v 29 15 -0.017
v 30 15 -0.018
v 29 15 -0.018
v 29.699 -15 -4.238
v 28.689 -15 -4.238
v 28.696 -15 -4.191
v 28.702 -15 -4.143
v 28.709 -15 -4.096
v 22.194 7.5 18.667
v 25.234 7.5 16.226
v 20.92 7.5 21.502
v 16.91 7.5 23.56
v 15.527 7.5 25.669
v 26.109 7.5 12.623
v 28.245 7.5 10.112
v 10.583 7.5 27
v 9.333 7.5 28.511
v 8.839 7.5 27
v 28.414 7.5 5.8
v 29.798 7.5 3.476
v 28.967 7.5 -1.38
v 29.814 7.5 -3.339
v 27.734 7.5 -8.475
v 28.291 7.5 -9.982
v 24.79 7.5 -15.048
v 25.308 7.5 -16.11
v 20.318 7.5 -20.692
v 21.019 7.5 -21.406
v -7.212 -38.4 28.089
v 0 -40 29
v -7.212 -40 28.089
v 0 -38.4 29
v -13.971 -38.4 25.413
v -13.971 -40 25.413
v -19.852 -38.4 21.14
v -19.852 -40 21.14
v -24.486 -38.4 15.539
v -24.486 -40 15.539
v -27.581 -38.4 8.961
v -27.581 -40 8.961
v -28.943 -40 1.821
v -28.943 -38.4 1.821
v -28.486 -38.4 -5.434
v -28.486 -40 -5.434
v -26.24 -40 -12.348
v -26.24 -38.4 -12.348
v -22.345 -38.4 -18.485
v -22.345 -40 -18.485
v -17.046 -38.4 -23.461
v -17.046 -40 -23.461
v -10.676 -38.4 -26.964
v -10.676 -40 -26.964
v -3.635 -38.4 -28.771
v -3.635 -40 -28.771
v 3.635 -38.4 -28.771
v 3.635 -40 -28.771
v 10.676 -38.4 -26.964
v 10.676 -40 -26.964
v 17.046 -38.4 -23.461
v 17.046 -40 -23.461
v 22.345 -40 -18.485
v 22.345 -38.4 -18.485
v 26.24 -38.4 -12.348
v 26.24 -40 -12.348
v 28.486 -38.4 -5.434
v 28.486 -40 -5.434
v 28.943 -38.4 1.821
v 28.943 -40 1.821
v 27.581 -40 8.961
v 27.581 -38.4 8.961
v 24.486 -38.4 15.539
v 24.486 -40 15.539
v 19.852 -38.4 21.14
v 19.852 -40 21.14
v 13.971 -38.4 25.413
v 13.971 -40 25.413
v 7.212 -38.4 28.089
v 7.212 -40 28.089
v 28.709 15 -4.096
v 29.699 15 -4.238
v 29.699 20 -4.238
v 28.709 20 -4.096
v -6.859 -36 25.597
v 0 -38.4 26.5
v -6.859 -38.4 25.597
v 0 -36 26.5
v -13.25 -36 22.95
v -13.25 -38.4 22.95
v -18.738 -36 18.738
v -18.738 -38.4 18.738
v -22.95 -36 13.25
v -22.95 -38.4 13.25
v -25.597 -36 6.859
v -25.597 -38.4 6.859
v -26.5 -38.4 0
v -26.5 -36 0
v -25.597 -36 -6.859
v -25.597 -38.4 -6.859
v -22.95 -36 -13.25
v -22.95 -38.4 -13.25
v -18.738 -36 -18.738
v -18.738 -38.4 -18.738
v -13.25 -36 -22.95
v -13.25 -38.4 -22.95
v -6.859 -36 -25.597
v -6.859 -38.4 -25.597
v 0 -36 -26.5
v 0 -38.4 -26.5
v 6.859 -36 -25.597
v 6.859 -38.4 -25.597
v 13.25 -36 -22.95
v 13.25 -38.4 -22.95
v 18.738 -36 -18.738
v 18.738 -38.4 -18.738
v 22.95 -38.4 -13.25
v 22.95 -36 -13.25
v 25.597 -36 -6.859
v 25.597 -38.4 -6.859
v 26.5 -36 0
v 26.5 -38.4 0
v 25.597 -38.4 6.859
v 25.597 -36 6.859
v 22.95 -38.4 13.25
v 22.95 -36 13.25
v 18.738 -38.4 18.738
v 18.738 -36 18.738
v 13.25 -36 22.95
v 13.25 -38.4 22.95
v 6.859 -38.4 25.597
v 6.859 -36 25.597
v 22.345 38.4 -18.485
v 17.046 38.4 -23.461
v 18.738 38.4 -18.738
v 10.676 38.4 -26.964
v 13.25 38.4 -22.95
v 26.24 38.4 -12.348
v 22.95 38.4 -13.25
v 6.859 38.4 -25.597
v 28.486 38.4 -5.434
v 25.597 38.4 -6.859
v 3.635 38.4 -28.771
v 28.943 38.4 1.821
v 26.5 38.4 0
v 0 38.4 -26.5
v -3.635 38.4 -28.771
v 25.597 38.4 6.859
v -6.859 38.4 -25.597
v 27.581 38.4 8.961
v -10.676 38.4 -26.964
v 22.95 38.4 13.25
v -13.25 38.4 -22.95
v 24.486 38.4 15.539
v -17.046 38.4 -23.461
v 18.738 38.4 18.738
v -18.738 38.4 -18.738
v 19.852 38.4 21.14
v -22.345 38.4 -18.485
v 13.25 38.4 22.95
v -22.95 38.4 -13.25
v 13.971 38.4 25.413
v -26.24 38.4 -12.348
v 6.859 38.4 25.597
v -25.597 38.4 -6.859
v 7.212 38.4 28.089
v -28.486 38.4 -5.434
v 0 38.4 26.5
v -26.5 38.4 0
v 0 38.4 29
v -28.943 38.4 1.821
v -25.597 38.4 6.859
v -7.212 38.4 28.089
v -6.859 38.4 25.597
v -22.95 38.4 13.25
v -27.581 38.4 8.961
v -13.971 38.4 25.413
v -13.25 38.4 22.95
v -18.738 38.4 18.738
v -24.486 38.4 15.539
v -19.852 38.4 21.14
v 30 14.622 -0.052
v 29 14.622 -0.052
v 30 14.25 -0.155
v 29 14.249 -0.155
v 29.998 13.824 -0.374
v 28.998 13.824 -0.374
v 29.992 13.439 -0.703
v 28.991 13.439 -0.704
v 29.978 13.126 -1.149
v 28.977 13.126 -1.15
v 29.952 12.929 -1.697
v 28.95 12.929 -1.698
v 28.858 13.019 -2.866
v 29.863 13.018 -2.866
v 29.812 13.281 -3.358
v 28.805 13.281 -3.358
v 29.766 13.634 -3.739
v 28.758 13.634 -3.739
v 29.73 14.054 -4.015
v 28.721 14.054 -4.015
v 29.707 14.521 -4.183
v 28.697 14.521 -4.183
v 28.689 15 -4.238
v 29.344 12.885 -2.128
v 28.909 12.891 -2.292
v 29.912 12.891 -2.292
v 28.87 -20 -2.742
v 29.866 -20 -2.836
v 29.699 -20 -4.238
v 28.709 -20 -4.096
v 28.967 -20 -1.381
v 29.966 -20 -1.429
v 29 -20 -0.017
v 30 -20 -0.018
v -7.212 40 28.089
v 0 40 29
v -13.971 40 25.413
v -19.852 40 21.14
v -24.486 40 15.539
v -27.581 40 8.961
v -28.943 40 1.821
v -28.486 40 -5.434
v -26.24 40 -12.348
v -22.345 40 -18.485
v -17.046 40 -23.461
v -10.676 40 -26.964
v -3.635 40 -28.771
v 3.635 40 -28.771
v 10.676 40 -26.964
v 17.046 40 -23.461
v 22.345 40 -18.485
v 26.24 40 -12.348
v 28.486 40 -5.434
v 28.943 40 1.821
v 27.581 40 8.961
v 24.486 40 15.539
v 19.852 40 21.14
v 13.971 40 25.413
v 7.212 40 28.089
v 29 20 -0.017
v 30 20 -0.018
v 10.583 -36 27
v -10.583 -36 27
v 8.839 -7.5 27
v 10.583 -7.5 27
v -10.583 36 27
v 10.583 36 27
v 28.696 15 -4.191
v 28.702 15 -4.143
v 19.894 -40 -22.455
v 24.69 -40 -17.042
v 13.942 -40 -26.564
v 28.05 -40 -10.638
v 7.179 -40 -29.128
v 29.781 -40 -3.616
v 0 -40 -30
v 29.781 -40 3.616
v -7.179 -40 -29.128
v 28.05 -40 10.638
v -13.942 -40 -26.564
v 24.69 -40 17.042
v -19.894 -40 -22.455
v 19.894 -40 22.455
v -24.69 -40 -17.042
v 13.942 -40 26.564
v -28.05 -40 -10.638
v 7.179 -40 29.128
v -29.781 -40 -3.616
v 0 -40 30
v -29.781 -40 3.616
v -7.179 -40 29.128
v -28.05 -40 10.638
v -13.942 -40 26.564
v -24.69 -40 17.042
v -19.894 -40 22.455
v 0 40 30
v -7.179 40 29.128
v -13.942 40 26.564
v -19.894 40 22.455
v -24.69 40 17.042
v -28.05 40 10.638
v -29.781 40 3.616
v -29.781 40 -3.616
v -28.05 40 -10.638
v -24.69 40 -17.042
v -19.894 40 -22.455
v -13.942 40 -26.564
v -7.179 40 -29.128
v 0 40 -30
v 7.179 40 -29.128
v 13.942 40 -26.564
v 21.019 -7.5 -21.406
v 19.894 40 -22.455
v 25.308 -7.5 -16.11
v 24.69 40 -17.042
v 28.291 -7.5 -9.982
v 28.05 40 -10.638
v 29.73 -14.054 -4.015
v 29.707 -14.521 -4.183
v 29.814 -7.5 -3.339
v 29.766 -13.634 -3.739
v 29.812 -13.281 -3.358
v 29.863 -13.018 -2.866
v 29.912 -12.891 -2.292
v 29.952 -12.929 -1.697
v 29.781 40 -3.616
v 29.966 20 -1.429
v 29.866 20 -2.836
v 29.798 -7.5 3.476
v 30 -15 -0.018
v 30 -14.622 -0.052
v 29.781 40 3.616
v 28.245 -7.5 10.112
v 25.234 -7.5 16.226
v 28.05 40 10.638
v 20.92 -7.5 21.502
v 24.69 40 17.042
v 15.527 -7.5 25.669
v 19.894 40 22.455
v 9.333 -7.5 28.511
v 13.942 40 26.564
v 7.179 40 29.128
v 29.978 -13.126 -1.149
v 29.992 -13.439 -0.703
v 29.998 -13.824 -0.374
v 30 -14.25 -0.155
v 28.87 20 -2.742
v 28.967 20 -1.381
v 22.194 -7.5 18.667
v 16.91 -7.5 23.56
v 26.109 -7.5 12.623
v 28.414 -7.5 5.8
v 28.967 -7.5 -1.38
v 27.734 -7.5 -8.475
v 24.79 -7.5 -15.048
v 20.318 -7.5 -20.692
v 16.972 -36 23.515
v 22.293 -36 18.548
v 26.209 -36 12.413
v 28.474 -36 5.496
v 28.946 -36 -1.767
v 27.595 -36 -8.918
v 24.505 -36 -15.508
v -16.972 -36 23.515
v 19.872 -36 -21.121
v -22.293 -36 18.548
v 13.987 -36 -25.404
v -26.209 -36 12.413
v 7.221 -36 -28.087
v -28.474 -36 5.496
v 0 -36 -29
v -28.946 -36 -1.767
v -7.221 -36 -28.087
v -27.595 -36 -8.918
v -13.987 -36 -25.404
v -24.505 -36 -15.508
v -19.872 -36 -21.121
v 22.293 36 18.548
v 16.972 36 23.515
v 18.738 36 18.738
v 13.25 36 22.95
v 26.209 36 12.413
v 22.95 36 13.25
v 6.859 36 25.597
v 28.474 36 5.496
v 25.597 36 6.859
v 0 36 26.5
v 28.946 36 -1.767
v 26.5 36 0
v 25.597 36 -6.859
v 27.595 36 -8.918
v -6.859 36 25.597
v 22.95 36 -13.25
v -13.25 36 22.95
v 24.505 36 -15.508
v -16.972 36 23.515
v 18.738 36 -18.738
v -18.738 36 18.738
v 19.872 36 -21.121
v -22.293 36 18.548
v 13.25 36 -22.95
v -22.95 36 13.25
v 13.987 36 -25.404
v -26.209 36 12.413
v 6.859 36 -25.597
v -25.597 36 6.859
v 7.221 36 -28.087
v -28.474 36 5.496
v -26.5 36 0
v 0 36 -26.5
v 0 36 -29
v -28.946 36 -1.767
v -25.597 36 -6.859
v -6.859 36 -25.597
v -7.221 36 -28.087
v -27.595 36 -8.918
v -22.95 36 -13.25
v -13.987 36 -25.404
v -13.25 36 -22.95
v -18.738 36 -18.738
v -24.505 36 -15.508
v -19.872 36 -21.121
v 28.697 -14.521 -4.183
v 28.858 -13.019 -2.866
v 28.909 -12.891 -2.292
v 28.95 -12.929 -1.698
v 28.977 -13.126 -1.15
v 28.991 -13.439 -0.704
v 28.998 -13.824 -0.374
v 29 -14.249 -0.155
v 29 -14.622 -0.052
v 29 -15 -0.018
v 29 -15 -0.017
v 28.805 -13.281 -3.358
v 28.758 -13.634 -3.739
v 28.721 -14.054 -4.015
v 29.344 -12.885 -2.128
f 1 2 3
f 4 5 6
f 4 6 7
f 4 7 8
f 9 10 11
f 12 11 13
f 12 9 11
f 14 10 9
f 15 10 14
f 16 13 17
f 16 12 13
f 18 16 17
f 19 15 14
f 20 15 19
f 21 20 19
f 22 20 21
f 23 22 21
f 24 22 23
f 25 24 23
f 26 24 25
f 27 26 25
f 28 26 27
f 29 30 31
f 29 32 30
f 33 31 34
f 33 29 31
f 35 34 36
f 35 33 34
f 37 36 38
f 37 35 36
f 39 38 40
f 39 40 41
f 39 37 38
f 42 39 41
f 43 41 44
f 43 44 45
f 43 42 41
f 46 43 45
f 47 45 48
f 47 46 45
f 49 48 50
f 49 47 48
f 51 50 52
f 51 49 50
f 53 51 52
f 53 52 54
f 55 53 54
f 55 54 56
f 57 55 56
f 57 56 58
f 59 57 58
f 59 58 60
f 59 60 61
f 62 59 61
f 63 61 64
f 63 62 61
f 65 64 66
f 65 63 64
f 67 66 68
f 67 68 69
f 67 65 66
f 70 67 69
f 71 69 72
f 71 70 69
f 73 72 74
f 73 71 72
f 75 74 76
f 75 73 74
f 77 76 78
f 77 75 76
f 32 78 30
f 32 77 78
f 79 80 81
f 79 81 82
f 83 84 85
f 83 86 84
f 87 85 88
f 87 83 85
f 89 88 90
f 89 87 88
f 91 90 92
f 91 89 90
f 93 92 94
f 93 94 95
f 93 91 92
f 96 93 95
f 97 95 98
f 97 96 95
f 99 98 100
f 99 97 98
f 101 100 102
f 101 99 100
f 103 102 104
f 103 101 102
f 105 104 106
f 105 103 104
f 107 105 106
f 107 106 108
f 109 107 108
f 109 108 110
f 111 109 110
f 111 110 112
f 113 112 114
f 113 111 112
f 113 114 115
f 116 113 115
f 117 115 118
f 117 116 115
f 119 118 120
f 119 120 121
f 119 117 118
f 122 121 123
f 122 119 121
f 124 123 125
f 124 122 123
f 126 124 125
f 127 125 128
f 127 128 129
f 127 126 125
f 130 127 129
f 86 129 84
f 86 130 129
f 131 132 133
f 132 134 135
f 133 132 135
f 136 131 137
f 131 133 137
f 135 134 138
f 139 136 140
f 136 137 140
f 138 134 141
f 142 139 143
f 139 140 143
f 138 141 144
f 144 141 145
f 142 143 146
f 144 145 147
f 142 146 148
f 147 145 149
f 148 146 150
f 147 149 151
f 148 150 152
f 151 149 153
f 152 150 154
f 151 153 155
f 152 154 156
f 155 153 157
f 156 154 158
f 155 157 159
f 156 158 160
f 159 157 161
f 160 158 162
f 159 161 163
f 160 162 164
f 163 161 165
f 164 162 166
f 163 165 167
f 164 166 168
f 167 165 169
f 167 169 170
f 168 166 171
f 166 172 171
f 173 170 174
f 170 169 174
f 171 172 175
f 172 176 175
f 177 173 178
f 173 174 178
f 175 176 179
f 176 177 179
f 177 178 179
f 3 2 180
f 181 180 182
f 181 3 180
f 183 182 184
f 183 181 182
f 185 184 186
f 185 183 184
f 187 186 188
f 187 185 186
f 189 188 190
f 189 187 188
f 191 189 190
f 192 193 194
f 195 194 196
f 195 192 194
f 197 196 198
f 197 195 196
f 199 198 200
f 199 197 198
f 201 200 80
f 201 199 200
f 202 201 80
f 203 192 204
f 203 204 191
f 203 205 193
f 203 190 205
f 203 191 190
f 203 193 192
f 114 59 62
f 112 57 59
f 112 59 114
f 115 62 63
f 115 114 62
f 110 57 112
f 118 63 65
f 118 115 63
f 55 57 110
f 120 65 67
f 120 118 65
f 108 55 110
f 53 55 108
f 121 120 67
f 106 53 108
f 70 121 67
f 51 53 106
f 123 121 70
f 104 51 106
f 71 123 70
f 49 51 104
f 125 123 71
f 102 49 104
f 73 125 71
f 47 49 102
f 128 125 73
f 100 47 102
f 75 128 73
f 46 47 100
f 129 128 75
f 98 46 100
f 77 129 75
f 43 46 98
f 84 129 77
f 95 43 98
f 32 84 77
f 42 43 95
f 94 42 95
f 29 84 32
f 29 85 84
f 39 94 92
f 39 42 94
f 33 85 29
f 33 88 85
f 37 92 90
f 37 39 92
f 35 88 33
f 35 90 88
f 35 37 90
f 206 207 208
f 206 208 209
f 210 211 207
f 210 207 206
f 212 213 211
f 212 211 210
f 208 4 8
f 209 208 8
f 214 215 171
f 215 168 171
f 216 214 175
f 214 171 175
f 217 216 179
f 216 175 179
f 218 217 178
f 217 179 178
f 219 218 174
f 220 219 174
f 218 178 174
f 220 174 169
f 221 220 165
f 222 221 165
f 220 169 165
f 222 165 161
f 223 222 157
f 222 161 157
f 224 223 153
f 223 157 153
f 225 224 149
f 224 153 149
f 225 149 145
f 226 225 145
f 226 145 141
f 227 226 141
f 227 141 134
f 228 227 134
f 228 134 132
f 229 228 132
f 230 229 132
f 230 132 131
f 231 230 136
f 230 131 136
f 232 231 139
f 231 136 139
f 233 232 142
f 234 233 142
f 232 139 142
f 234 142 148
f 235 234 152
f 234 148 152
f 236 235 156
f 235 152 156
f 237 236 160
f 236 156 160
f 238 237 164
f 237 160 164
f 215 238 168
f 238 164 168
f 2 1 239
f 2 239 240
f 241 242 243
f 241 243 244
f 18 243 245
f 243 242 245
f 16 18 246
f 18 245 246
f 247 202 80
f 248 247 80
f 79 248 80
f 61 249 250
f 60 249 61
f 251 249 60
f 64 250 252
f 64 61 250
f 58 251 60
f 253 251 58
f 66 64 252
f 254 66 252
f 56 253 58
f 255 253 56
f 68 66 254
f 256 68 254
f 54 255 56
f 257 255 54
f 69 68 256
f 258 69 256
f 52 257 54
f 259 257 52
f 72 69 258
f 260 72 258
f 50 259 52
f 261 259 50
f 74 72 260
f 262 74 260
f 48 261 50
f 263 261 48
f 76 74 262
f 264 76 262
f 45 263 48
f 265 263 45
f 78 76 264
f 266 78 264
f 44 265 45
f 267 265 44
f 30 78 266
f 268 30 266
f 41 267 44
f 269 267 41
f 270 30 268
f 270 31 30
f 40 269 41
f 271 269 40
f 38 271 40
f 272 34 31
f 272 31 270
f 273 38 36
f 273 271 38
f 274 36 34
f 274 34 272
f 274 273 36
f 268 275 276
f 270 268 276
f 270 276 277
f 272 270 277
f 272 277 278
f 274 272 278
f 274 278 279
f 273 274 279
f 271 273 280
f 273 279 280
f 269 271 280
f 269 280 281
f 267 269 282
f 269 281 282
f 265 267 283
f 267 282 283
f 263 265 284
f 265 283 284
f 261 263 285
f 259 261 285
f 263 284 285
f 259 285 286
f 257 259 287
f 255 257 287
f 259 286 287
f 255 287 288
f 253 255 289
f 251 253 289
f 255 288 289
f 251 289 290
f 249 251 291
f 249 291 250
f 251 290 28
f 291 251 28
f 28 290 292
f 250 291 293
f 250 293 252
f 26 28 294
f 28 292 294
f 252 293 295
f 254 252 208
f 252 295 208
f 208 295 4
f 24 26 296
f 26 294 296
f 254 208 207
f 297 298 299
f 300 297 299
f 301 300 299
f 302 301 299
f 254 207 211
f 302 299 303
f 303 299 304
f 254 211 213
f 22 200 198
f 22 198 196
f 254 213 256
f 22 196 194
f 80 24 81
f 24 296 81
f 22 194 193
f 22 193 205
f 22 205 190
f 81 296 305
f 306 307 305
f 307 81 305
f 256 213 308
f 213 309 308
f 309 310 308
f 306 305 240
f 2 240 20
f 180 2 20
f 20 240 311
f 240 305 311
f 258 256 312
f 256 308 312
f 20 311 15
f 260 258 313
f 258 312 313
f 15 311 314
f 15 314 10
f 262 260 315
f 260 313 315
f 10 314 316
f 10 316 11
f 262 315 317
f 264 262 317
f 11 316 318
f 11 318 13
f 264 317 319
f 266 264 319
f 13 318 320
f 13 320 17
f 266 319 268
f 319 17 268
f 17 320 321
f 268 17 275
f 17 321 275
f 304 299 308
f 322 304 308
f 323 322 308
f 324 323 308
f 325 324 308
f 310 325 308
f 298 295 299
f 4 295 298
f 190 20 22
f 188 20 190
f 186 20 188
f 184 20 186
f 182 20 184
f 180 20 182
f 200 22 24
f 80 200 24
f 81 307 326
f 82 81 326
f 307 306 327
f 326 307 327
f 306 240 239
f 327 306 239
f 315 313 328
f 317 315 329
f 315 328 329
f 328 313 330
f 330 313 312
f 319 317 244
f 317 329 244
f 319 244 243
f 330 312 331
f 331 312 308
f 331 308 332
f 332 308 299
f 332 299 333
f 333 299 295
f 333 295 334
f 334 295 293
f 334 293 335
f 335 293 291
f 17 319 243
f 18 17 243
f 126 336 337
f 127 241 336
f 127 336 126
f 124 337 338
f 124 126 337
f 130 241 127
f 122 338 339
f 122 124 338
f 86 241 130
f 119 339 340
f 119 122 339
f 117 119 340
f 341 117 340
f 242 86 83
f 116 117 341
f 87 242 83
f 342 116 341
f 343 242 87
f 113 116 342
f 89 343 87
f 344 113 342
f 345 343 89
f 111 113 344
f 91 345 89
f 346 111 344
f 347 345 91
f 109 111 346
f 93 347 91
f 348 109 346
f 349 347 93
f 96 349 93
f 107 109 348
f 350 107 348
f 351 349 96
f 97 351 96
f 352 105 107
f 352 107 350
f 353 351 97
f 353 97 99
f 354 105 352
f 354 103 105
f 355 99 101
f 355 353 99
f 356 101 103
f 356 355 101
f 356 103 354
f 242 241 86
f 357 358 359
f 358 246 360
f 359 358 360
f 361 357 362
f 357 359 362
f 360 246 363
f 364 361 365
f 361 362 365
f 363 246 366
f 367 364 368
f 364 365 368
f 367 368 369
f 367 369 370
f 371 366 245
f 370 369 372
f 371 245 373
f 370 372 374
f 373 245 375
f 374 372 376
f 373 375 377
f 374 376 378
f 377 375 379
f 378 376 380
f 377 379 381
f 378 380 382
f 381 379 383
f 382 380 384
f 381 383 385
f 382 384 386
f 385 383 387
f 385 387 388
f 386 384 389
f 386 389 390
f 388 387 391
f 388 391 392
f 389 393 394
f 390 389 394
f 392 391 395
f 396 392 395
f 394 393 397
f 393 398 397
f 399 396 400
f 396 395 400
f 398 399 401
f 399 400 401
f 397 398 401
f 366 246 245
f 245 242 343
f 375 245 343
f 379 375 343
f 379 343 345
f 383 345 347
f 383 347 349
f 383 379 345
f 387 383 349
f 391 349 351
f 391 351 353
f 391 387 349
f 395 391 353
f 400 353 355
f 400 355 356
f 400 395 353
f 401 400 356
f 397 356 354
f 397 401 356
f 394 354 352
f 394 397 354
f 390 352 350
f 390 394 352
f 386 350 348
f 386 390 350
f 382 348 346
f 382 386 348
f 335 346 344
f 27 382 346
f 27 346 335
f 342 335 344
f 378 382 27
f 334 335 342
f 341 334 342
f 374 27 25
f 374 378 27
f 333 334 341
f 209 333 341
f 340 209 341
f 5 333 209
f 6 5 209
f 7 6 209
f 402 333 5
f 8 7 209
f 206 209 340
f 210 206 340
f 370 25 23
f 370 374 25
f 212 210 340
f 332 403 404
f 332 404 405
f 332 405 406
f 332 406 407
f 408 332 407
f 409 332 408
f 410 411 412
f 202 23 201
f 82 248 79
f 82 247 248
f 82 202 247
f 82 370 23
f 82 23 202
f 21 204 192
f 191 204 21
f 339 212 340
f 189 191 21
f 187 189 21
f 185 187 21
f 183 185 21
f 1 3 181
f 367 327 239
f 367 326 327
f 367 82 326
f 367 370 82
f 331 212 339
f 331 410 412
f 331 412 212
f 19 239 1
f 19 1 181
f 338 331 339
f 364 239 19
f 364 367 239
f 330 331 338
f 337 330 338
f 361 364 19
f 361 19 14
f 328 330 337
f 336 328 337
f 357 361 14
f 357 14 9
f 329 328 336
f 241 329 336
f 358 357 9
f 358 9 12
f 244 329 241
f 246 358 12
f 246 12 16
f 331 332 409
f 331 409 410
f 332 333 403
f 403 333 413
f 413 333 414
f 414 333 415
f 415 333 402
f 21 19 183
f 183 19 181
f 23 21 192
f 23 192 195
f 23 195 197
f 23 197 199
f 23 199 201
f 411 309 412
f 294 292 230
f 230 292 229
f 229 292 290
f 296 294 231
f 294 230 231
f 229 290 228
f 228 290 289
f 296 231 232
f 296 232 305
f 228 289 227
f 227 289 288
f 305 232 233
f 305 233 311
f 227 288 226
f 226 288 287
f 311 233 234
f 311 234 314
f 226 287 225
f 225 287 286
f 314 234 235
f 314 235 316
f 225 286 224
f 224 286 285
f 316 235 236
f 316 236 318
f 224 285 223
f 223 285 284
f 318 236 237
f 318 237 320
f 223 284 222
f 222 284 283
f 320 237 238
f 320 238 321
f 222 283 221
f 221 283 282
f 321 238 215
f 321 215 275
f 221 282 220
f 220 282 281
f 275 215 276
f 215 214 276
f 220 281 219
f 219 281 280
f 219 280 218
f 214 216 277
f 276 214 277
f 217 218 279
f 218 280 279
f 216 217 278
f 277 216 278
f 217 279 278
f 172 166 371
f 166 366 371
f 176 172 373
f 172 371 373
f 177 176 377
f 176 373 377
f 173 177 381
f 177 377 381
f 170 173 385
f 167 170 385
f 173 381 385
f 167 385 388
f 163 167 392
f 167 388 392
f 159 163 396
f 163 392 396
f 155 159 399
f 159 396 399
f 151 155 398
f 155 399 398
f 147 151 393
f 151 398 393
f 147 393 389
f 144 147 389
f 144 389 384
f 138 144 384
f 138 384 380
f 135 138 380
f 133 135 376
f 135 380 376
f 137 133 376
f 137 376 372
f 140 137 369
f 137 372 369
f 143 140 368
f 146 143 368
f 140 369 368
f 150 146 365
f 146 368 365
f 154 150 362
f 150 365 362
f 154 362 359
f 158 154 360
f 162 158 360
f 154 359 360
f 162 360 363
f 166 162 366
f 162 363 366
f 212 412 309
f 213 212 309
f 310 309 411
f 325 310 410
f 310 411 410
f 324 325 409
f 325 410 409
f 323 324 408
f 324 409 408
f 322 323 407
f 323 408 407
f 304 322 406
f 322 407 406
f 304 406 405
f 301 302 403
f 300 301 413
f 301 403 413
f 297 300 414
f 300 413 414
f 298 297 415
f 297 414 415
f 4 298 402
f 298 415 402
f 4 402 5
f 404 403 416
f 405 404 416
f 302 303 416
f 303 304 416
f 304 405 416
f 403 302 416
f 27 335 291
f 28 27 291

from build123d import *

# Parameters (mm, degrees)
EXTRUDE_11_REACH             = 60.31
EXTRUDE_11_DIRECTION_2_REACH = 60.31
CUT_EXTRUDE_1_DEPTH          = 7.5
CUT_EXTRUDE_1_DEPTH_BACK     = 7.5
CUT_EXTRUDE_2_DEPTH          = 5
CUT_EXTRUDE_START            = 28.688718626
CUT_EXTRUDE_3_DEPTH          = 1.311276176


# Read off the part's stored shape, not the designer's step: 切除-拉伸3
with BuildPart() as part:
    # 草图1 → 旋转1 (revolve)
    with BuildSketch(Plane.XY, mode=Mode.PRIVATE) as revolve_1_sk:
        Polygon((26.5, 38.4), (26.5, 36), (29, 36), (29, 0), (30, 0), (30, 40), (29, 40), (29, 38.4), align=None)
    revolve_1 = revolve(revolve_1_sk.sketch.rotate(Axis((0, 66, 0), (0, -1, 0)), 90), axis=Axis((0, 66, 0), (0, -1, 0)))

    # 镜向1: 旋转1 across plane
    add(revolve_1.mirror(Plane.ZX))

    # 凸台-拉伸11: up to this face of the body (flat: up to its plane)
    extrude_11_end = Plane(part.part.faces().sort_by_distance((0, 36, -27.320243866))[0])
    # 草图11 → 凸台-拉伸11 (add, up to the picked face)
    with BuildSketch(Plane(origin=(0, 0, 0), x_dir=(1, 0, 0), z_dir=(0, 1, 0)), mode=Mode.PRIVATE) as extrude_11_sk1:
        with BuildLine():
            Line((-13.076696831, -27), (13.076696831, -27))
            ThreePointArc((13.076696831, -27), (0, -30), (-13.076696831, -27))
        make_face()
    extrude_11_tool1 = split(extrude(extrude_11_sk1.sketch, amount=EXTRUDE_11_REACH, mode=Mode.PRIVATE), bisect_by=extrude_11_end, keep=Keep.BOTH, mode=Mode.PRIVATE)
    add(extrude_11_tool1.solids().sort_by(Axis((0, 0, 28.205296), (0, 1, 0)))[0])

    # 凸台-拉伸11 direction 2: up to this face of the body (flat: up to its plane)
    extrude_11_direction_2_end = Plane(part.part.faces().sort_by_distance((0, -36, -27.320243866))[0])
    # 草图11 → 凸台-拉伸11 direction 2 (add, up to the picked face)
    with BuildSketch(Plane(origin=(0, 0, 0), x_dir=(1, 0, 0), z_dir=(0, 1, 0)), mode=Mode.PRIVATE) as extrude_11_direction_2_sk1:
        with BuildLine():
            Line((-13.076696831, -27), (13.076696831, -27))
            ThreePointArc((13.076696831, -27), (0, -30), (-13.076696831, -27))
        make_face()
    extrude_11_direction_2_tool1 = split(extrude(extrude_11_direction_2_sk1.sketch, amount=-EXTRUDE_11_DIRECTION_2_REACH, mode=Mode.PRIVATE), bisect_by=extrude_11_direction_2_end, keep=Keep.BOTH, mode=Mode.PRIVATE)
    add(extrude_11_direction_2_tool1.solids().sort_by(Axis((0, 0, 28.205296), (0, -1, 0)))[0])

    # 草图12 → 切除-拉伸1 (cut, two sides: drawn at the far end of the back side and taken through both)
    with BuildSketch(Plane(origin=(0, 0, 0), x_dir=(1, 0, 0), z_dir=(0, 1, 0)).offset(-CUT_EXTRUDE_1_DEPTH_BACK)):
        with BuildLine():
            Line((0, 0), (22.520337054, 22.934948885))
            ThreePointArc((22.520337054, 22.934948885), (31.296937417, -7.32660697), (10, -30.547953473))
            Line((10, -30.547953473), (0, 0))
        make_face()
    extrude(amount=CUT_EXTRUDE_1_DEPTH + CUT_EXTRUDE_1_DEPTH_BACK, mode=Mode.SUBTRACT)

    # Sketch 3D_2 → 切除-拉伸2 (cut)
    with BuildSketch(Plane(origin=(35, 15, -4.993961669), x_dir=(-0.989973390659655, 0, 0.1412539761770484), z_dir=(0, 1, 0))):
        with BuildLine():
            Line((0, 0), (35.354485616, 0))
            Line((35.354485616, 0), (0.330334968, 4.976372773))
            ThreePointArc((0.330334968, 4.976372773), (0.075684949, 2.494126297), (0, 0))
        make_face()
    cut_extrude_2 = extrude(amount=CUT_EXTRUDE_2_DEPTH, mode=Mode.SUBTRACT)

    # 镜向2: 切除-拉伸2 across plane
    add(cut_extrude_2.mirror(Plane.ZX), mode=Mode.SUBTRACT)

    # 切除-拉伸3 outline → 切除-拉伸3 (cut)
    with BuildSketch(Plane.YZ.offset(CUT_EXTRUDE_START)):
        with BuildLine():
            Line((15, -4.237619285), (15, -0.017659399))
            add(Edge.make_bspline(
                [(15, -0.017659399), (12.884666816, -0.017659399), (12.884666816, -2.127639342), (12.884666816, -4.237619285), (15, -4.237619285)],
                knots=[3.141592654, 3.141592654, 3.141592654, 4.71238898, 4.71238898, 6.283185307, 6.283185307, 6.283185307], degree=2, weights=[1, 0.707106781, 1, 0.707106781, 1]))
        make_face()
    cut_extrude_3 = extrude(amount=CUT_EXTRUDE_3_DEPTH, mode=Mode.SUBTRACT)

    # 镜向3: 切除-拉伸3 across plane
    add(cut_extrude_3.mirror(Plane.ZX), mode=Mode.SUBTRACT)


solid = part.part
